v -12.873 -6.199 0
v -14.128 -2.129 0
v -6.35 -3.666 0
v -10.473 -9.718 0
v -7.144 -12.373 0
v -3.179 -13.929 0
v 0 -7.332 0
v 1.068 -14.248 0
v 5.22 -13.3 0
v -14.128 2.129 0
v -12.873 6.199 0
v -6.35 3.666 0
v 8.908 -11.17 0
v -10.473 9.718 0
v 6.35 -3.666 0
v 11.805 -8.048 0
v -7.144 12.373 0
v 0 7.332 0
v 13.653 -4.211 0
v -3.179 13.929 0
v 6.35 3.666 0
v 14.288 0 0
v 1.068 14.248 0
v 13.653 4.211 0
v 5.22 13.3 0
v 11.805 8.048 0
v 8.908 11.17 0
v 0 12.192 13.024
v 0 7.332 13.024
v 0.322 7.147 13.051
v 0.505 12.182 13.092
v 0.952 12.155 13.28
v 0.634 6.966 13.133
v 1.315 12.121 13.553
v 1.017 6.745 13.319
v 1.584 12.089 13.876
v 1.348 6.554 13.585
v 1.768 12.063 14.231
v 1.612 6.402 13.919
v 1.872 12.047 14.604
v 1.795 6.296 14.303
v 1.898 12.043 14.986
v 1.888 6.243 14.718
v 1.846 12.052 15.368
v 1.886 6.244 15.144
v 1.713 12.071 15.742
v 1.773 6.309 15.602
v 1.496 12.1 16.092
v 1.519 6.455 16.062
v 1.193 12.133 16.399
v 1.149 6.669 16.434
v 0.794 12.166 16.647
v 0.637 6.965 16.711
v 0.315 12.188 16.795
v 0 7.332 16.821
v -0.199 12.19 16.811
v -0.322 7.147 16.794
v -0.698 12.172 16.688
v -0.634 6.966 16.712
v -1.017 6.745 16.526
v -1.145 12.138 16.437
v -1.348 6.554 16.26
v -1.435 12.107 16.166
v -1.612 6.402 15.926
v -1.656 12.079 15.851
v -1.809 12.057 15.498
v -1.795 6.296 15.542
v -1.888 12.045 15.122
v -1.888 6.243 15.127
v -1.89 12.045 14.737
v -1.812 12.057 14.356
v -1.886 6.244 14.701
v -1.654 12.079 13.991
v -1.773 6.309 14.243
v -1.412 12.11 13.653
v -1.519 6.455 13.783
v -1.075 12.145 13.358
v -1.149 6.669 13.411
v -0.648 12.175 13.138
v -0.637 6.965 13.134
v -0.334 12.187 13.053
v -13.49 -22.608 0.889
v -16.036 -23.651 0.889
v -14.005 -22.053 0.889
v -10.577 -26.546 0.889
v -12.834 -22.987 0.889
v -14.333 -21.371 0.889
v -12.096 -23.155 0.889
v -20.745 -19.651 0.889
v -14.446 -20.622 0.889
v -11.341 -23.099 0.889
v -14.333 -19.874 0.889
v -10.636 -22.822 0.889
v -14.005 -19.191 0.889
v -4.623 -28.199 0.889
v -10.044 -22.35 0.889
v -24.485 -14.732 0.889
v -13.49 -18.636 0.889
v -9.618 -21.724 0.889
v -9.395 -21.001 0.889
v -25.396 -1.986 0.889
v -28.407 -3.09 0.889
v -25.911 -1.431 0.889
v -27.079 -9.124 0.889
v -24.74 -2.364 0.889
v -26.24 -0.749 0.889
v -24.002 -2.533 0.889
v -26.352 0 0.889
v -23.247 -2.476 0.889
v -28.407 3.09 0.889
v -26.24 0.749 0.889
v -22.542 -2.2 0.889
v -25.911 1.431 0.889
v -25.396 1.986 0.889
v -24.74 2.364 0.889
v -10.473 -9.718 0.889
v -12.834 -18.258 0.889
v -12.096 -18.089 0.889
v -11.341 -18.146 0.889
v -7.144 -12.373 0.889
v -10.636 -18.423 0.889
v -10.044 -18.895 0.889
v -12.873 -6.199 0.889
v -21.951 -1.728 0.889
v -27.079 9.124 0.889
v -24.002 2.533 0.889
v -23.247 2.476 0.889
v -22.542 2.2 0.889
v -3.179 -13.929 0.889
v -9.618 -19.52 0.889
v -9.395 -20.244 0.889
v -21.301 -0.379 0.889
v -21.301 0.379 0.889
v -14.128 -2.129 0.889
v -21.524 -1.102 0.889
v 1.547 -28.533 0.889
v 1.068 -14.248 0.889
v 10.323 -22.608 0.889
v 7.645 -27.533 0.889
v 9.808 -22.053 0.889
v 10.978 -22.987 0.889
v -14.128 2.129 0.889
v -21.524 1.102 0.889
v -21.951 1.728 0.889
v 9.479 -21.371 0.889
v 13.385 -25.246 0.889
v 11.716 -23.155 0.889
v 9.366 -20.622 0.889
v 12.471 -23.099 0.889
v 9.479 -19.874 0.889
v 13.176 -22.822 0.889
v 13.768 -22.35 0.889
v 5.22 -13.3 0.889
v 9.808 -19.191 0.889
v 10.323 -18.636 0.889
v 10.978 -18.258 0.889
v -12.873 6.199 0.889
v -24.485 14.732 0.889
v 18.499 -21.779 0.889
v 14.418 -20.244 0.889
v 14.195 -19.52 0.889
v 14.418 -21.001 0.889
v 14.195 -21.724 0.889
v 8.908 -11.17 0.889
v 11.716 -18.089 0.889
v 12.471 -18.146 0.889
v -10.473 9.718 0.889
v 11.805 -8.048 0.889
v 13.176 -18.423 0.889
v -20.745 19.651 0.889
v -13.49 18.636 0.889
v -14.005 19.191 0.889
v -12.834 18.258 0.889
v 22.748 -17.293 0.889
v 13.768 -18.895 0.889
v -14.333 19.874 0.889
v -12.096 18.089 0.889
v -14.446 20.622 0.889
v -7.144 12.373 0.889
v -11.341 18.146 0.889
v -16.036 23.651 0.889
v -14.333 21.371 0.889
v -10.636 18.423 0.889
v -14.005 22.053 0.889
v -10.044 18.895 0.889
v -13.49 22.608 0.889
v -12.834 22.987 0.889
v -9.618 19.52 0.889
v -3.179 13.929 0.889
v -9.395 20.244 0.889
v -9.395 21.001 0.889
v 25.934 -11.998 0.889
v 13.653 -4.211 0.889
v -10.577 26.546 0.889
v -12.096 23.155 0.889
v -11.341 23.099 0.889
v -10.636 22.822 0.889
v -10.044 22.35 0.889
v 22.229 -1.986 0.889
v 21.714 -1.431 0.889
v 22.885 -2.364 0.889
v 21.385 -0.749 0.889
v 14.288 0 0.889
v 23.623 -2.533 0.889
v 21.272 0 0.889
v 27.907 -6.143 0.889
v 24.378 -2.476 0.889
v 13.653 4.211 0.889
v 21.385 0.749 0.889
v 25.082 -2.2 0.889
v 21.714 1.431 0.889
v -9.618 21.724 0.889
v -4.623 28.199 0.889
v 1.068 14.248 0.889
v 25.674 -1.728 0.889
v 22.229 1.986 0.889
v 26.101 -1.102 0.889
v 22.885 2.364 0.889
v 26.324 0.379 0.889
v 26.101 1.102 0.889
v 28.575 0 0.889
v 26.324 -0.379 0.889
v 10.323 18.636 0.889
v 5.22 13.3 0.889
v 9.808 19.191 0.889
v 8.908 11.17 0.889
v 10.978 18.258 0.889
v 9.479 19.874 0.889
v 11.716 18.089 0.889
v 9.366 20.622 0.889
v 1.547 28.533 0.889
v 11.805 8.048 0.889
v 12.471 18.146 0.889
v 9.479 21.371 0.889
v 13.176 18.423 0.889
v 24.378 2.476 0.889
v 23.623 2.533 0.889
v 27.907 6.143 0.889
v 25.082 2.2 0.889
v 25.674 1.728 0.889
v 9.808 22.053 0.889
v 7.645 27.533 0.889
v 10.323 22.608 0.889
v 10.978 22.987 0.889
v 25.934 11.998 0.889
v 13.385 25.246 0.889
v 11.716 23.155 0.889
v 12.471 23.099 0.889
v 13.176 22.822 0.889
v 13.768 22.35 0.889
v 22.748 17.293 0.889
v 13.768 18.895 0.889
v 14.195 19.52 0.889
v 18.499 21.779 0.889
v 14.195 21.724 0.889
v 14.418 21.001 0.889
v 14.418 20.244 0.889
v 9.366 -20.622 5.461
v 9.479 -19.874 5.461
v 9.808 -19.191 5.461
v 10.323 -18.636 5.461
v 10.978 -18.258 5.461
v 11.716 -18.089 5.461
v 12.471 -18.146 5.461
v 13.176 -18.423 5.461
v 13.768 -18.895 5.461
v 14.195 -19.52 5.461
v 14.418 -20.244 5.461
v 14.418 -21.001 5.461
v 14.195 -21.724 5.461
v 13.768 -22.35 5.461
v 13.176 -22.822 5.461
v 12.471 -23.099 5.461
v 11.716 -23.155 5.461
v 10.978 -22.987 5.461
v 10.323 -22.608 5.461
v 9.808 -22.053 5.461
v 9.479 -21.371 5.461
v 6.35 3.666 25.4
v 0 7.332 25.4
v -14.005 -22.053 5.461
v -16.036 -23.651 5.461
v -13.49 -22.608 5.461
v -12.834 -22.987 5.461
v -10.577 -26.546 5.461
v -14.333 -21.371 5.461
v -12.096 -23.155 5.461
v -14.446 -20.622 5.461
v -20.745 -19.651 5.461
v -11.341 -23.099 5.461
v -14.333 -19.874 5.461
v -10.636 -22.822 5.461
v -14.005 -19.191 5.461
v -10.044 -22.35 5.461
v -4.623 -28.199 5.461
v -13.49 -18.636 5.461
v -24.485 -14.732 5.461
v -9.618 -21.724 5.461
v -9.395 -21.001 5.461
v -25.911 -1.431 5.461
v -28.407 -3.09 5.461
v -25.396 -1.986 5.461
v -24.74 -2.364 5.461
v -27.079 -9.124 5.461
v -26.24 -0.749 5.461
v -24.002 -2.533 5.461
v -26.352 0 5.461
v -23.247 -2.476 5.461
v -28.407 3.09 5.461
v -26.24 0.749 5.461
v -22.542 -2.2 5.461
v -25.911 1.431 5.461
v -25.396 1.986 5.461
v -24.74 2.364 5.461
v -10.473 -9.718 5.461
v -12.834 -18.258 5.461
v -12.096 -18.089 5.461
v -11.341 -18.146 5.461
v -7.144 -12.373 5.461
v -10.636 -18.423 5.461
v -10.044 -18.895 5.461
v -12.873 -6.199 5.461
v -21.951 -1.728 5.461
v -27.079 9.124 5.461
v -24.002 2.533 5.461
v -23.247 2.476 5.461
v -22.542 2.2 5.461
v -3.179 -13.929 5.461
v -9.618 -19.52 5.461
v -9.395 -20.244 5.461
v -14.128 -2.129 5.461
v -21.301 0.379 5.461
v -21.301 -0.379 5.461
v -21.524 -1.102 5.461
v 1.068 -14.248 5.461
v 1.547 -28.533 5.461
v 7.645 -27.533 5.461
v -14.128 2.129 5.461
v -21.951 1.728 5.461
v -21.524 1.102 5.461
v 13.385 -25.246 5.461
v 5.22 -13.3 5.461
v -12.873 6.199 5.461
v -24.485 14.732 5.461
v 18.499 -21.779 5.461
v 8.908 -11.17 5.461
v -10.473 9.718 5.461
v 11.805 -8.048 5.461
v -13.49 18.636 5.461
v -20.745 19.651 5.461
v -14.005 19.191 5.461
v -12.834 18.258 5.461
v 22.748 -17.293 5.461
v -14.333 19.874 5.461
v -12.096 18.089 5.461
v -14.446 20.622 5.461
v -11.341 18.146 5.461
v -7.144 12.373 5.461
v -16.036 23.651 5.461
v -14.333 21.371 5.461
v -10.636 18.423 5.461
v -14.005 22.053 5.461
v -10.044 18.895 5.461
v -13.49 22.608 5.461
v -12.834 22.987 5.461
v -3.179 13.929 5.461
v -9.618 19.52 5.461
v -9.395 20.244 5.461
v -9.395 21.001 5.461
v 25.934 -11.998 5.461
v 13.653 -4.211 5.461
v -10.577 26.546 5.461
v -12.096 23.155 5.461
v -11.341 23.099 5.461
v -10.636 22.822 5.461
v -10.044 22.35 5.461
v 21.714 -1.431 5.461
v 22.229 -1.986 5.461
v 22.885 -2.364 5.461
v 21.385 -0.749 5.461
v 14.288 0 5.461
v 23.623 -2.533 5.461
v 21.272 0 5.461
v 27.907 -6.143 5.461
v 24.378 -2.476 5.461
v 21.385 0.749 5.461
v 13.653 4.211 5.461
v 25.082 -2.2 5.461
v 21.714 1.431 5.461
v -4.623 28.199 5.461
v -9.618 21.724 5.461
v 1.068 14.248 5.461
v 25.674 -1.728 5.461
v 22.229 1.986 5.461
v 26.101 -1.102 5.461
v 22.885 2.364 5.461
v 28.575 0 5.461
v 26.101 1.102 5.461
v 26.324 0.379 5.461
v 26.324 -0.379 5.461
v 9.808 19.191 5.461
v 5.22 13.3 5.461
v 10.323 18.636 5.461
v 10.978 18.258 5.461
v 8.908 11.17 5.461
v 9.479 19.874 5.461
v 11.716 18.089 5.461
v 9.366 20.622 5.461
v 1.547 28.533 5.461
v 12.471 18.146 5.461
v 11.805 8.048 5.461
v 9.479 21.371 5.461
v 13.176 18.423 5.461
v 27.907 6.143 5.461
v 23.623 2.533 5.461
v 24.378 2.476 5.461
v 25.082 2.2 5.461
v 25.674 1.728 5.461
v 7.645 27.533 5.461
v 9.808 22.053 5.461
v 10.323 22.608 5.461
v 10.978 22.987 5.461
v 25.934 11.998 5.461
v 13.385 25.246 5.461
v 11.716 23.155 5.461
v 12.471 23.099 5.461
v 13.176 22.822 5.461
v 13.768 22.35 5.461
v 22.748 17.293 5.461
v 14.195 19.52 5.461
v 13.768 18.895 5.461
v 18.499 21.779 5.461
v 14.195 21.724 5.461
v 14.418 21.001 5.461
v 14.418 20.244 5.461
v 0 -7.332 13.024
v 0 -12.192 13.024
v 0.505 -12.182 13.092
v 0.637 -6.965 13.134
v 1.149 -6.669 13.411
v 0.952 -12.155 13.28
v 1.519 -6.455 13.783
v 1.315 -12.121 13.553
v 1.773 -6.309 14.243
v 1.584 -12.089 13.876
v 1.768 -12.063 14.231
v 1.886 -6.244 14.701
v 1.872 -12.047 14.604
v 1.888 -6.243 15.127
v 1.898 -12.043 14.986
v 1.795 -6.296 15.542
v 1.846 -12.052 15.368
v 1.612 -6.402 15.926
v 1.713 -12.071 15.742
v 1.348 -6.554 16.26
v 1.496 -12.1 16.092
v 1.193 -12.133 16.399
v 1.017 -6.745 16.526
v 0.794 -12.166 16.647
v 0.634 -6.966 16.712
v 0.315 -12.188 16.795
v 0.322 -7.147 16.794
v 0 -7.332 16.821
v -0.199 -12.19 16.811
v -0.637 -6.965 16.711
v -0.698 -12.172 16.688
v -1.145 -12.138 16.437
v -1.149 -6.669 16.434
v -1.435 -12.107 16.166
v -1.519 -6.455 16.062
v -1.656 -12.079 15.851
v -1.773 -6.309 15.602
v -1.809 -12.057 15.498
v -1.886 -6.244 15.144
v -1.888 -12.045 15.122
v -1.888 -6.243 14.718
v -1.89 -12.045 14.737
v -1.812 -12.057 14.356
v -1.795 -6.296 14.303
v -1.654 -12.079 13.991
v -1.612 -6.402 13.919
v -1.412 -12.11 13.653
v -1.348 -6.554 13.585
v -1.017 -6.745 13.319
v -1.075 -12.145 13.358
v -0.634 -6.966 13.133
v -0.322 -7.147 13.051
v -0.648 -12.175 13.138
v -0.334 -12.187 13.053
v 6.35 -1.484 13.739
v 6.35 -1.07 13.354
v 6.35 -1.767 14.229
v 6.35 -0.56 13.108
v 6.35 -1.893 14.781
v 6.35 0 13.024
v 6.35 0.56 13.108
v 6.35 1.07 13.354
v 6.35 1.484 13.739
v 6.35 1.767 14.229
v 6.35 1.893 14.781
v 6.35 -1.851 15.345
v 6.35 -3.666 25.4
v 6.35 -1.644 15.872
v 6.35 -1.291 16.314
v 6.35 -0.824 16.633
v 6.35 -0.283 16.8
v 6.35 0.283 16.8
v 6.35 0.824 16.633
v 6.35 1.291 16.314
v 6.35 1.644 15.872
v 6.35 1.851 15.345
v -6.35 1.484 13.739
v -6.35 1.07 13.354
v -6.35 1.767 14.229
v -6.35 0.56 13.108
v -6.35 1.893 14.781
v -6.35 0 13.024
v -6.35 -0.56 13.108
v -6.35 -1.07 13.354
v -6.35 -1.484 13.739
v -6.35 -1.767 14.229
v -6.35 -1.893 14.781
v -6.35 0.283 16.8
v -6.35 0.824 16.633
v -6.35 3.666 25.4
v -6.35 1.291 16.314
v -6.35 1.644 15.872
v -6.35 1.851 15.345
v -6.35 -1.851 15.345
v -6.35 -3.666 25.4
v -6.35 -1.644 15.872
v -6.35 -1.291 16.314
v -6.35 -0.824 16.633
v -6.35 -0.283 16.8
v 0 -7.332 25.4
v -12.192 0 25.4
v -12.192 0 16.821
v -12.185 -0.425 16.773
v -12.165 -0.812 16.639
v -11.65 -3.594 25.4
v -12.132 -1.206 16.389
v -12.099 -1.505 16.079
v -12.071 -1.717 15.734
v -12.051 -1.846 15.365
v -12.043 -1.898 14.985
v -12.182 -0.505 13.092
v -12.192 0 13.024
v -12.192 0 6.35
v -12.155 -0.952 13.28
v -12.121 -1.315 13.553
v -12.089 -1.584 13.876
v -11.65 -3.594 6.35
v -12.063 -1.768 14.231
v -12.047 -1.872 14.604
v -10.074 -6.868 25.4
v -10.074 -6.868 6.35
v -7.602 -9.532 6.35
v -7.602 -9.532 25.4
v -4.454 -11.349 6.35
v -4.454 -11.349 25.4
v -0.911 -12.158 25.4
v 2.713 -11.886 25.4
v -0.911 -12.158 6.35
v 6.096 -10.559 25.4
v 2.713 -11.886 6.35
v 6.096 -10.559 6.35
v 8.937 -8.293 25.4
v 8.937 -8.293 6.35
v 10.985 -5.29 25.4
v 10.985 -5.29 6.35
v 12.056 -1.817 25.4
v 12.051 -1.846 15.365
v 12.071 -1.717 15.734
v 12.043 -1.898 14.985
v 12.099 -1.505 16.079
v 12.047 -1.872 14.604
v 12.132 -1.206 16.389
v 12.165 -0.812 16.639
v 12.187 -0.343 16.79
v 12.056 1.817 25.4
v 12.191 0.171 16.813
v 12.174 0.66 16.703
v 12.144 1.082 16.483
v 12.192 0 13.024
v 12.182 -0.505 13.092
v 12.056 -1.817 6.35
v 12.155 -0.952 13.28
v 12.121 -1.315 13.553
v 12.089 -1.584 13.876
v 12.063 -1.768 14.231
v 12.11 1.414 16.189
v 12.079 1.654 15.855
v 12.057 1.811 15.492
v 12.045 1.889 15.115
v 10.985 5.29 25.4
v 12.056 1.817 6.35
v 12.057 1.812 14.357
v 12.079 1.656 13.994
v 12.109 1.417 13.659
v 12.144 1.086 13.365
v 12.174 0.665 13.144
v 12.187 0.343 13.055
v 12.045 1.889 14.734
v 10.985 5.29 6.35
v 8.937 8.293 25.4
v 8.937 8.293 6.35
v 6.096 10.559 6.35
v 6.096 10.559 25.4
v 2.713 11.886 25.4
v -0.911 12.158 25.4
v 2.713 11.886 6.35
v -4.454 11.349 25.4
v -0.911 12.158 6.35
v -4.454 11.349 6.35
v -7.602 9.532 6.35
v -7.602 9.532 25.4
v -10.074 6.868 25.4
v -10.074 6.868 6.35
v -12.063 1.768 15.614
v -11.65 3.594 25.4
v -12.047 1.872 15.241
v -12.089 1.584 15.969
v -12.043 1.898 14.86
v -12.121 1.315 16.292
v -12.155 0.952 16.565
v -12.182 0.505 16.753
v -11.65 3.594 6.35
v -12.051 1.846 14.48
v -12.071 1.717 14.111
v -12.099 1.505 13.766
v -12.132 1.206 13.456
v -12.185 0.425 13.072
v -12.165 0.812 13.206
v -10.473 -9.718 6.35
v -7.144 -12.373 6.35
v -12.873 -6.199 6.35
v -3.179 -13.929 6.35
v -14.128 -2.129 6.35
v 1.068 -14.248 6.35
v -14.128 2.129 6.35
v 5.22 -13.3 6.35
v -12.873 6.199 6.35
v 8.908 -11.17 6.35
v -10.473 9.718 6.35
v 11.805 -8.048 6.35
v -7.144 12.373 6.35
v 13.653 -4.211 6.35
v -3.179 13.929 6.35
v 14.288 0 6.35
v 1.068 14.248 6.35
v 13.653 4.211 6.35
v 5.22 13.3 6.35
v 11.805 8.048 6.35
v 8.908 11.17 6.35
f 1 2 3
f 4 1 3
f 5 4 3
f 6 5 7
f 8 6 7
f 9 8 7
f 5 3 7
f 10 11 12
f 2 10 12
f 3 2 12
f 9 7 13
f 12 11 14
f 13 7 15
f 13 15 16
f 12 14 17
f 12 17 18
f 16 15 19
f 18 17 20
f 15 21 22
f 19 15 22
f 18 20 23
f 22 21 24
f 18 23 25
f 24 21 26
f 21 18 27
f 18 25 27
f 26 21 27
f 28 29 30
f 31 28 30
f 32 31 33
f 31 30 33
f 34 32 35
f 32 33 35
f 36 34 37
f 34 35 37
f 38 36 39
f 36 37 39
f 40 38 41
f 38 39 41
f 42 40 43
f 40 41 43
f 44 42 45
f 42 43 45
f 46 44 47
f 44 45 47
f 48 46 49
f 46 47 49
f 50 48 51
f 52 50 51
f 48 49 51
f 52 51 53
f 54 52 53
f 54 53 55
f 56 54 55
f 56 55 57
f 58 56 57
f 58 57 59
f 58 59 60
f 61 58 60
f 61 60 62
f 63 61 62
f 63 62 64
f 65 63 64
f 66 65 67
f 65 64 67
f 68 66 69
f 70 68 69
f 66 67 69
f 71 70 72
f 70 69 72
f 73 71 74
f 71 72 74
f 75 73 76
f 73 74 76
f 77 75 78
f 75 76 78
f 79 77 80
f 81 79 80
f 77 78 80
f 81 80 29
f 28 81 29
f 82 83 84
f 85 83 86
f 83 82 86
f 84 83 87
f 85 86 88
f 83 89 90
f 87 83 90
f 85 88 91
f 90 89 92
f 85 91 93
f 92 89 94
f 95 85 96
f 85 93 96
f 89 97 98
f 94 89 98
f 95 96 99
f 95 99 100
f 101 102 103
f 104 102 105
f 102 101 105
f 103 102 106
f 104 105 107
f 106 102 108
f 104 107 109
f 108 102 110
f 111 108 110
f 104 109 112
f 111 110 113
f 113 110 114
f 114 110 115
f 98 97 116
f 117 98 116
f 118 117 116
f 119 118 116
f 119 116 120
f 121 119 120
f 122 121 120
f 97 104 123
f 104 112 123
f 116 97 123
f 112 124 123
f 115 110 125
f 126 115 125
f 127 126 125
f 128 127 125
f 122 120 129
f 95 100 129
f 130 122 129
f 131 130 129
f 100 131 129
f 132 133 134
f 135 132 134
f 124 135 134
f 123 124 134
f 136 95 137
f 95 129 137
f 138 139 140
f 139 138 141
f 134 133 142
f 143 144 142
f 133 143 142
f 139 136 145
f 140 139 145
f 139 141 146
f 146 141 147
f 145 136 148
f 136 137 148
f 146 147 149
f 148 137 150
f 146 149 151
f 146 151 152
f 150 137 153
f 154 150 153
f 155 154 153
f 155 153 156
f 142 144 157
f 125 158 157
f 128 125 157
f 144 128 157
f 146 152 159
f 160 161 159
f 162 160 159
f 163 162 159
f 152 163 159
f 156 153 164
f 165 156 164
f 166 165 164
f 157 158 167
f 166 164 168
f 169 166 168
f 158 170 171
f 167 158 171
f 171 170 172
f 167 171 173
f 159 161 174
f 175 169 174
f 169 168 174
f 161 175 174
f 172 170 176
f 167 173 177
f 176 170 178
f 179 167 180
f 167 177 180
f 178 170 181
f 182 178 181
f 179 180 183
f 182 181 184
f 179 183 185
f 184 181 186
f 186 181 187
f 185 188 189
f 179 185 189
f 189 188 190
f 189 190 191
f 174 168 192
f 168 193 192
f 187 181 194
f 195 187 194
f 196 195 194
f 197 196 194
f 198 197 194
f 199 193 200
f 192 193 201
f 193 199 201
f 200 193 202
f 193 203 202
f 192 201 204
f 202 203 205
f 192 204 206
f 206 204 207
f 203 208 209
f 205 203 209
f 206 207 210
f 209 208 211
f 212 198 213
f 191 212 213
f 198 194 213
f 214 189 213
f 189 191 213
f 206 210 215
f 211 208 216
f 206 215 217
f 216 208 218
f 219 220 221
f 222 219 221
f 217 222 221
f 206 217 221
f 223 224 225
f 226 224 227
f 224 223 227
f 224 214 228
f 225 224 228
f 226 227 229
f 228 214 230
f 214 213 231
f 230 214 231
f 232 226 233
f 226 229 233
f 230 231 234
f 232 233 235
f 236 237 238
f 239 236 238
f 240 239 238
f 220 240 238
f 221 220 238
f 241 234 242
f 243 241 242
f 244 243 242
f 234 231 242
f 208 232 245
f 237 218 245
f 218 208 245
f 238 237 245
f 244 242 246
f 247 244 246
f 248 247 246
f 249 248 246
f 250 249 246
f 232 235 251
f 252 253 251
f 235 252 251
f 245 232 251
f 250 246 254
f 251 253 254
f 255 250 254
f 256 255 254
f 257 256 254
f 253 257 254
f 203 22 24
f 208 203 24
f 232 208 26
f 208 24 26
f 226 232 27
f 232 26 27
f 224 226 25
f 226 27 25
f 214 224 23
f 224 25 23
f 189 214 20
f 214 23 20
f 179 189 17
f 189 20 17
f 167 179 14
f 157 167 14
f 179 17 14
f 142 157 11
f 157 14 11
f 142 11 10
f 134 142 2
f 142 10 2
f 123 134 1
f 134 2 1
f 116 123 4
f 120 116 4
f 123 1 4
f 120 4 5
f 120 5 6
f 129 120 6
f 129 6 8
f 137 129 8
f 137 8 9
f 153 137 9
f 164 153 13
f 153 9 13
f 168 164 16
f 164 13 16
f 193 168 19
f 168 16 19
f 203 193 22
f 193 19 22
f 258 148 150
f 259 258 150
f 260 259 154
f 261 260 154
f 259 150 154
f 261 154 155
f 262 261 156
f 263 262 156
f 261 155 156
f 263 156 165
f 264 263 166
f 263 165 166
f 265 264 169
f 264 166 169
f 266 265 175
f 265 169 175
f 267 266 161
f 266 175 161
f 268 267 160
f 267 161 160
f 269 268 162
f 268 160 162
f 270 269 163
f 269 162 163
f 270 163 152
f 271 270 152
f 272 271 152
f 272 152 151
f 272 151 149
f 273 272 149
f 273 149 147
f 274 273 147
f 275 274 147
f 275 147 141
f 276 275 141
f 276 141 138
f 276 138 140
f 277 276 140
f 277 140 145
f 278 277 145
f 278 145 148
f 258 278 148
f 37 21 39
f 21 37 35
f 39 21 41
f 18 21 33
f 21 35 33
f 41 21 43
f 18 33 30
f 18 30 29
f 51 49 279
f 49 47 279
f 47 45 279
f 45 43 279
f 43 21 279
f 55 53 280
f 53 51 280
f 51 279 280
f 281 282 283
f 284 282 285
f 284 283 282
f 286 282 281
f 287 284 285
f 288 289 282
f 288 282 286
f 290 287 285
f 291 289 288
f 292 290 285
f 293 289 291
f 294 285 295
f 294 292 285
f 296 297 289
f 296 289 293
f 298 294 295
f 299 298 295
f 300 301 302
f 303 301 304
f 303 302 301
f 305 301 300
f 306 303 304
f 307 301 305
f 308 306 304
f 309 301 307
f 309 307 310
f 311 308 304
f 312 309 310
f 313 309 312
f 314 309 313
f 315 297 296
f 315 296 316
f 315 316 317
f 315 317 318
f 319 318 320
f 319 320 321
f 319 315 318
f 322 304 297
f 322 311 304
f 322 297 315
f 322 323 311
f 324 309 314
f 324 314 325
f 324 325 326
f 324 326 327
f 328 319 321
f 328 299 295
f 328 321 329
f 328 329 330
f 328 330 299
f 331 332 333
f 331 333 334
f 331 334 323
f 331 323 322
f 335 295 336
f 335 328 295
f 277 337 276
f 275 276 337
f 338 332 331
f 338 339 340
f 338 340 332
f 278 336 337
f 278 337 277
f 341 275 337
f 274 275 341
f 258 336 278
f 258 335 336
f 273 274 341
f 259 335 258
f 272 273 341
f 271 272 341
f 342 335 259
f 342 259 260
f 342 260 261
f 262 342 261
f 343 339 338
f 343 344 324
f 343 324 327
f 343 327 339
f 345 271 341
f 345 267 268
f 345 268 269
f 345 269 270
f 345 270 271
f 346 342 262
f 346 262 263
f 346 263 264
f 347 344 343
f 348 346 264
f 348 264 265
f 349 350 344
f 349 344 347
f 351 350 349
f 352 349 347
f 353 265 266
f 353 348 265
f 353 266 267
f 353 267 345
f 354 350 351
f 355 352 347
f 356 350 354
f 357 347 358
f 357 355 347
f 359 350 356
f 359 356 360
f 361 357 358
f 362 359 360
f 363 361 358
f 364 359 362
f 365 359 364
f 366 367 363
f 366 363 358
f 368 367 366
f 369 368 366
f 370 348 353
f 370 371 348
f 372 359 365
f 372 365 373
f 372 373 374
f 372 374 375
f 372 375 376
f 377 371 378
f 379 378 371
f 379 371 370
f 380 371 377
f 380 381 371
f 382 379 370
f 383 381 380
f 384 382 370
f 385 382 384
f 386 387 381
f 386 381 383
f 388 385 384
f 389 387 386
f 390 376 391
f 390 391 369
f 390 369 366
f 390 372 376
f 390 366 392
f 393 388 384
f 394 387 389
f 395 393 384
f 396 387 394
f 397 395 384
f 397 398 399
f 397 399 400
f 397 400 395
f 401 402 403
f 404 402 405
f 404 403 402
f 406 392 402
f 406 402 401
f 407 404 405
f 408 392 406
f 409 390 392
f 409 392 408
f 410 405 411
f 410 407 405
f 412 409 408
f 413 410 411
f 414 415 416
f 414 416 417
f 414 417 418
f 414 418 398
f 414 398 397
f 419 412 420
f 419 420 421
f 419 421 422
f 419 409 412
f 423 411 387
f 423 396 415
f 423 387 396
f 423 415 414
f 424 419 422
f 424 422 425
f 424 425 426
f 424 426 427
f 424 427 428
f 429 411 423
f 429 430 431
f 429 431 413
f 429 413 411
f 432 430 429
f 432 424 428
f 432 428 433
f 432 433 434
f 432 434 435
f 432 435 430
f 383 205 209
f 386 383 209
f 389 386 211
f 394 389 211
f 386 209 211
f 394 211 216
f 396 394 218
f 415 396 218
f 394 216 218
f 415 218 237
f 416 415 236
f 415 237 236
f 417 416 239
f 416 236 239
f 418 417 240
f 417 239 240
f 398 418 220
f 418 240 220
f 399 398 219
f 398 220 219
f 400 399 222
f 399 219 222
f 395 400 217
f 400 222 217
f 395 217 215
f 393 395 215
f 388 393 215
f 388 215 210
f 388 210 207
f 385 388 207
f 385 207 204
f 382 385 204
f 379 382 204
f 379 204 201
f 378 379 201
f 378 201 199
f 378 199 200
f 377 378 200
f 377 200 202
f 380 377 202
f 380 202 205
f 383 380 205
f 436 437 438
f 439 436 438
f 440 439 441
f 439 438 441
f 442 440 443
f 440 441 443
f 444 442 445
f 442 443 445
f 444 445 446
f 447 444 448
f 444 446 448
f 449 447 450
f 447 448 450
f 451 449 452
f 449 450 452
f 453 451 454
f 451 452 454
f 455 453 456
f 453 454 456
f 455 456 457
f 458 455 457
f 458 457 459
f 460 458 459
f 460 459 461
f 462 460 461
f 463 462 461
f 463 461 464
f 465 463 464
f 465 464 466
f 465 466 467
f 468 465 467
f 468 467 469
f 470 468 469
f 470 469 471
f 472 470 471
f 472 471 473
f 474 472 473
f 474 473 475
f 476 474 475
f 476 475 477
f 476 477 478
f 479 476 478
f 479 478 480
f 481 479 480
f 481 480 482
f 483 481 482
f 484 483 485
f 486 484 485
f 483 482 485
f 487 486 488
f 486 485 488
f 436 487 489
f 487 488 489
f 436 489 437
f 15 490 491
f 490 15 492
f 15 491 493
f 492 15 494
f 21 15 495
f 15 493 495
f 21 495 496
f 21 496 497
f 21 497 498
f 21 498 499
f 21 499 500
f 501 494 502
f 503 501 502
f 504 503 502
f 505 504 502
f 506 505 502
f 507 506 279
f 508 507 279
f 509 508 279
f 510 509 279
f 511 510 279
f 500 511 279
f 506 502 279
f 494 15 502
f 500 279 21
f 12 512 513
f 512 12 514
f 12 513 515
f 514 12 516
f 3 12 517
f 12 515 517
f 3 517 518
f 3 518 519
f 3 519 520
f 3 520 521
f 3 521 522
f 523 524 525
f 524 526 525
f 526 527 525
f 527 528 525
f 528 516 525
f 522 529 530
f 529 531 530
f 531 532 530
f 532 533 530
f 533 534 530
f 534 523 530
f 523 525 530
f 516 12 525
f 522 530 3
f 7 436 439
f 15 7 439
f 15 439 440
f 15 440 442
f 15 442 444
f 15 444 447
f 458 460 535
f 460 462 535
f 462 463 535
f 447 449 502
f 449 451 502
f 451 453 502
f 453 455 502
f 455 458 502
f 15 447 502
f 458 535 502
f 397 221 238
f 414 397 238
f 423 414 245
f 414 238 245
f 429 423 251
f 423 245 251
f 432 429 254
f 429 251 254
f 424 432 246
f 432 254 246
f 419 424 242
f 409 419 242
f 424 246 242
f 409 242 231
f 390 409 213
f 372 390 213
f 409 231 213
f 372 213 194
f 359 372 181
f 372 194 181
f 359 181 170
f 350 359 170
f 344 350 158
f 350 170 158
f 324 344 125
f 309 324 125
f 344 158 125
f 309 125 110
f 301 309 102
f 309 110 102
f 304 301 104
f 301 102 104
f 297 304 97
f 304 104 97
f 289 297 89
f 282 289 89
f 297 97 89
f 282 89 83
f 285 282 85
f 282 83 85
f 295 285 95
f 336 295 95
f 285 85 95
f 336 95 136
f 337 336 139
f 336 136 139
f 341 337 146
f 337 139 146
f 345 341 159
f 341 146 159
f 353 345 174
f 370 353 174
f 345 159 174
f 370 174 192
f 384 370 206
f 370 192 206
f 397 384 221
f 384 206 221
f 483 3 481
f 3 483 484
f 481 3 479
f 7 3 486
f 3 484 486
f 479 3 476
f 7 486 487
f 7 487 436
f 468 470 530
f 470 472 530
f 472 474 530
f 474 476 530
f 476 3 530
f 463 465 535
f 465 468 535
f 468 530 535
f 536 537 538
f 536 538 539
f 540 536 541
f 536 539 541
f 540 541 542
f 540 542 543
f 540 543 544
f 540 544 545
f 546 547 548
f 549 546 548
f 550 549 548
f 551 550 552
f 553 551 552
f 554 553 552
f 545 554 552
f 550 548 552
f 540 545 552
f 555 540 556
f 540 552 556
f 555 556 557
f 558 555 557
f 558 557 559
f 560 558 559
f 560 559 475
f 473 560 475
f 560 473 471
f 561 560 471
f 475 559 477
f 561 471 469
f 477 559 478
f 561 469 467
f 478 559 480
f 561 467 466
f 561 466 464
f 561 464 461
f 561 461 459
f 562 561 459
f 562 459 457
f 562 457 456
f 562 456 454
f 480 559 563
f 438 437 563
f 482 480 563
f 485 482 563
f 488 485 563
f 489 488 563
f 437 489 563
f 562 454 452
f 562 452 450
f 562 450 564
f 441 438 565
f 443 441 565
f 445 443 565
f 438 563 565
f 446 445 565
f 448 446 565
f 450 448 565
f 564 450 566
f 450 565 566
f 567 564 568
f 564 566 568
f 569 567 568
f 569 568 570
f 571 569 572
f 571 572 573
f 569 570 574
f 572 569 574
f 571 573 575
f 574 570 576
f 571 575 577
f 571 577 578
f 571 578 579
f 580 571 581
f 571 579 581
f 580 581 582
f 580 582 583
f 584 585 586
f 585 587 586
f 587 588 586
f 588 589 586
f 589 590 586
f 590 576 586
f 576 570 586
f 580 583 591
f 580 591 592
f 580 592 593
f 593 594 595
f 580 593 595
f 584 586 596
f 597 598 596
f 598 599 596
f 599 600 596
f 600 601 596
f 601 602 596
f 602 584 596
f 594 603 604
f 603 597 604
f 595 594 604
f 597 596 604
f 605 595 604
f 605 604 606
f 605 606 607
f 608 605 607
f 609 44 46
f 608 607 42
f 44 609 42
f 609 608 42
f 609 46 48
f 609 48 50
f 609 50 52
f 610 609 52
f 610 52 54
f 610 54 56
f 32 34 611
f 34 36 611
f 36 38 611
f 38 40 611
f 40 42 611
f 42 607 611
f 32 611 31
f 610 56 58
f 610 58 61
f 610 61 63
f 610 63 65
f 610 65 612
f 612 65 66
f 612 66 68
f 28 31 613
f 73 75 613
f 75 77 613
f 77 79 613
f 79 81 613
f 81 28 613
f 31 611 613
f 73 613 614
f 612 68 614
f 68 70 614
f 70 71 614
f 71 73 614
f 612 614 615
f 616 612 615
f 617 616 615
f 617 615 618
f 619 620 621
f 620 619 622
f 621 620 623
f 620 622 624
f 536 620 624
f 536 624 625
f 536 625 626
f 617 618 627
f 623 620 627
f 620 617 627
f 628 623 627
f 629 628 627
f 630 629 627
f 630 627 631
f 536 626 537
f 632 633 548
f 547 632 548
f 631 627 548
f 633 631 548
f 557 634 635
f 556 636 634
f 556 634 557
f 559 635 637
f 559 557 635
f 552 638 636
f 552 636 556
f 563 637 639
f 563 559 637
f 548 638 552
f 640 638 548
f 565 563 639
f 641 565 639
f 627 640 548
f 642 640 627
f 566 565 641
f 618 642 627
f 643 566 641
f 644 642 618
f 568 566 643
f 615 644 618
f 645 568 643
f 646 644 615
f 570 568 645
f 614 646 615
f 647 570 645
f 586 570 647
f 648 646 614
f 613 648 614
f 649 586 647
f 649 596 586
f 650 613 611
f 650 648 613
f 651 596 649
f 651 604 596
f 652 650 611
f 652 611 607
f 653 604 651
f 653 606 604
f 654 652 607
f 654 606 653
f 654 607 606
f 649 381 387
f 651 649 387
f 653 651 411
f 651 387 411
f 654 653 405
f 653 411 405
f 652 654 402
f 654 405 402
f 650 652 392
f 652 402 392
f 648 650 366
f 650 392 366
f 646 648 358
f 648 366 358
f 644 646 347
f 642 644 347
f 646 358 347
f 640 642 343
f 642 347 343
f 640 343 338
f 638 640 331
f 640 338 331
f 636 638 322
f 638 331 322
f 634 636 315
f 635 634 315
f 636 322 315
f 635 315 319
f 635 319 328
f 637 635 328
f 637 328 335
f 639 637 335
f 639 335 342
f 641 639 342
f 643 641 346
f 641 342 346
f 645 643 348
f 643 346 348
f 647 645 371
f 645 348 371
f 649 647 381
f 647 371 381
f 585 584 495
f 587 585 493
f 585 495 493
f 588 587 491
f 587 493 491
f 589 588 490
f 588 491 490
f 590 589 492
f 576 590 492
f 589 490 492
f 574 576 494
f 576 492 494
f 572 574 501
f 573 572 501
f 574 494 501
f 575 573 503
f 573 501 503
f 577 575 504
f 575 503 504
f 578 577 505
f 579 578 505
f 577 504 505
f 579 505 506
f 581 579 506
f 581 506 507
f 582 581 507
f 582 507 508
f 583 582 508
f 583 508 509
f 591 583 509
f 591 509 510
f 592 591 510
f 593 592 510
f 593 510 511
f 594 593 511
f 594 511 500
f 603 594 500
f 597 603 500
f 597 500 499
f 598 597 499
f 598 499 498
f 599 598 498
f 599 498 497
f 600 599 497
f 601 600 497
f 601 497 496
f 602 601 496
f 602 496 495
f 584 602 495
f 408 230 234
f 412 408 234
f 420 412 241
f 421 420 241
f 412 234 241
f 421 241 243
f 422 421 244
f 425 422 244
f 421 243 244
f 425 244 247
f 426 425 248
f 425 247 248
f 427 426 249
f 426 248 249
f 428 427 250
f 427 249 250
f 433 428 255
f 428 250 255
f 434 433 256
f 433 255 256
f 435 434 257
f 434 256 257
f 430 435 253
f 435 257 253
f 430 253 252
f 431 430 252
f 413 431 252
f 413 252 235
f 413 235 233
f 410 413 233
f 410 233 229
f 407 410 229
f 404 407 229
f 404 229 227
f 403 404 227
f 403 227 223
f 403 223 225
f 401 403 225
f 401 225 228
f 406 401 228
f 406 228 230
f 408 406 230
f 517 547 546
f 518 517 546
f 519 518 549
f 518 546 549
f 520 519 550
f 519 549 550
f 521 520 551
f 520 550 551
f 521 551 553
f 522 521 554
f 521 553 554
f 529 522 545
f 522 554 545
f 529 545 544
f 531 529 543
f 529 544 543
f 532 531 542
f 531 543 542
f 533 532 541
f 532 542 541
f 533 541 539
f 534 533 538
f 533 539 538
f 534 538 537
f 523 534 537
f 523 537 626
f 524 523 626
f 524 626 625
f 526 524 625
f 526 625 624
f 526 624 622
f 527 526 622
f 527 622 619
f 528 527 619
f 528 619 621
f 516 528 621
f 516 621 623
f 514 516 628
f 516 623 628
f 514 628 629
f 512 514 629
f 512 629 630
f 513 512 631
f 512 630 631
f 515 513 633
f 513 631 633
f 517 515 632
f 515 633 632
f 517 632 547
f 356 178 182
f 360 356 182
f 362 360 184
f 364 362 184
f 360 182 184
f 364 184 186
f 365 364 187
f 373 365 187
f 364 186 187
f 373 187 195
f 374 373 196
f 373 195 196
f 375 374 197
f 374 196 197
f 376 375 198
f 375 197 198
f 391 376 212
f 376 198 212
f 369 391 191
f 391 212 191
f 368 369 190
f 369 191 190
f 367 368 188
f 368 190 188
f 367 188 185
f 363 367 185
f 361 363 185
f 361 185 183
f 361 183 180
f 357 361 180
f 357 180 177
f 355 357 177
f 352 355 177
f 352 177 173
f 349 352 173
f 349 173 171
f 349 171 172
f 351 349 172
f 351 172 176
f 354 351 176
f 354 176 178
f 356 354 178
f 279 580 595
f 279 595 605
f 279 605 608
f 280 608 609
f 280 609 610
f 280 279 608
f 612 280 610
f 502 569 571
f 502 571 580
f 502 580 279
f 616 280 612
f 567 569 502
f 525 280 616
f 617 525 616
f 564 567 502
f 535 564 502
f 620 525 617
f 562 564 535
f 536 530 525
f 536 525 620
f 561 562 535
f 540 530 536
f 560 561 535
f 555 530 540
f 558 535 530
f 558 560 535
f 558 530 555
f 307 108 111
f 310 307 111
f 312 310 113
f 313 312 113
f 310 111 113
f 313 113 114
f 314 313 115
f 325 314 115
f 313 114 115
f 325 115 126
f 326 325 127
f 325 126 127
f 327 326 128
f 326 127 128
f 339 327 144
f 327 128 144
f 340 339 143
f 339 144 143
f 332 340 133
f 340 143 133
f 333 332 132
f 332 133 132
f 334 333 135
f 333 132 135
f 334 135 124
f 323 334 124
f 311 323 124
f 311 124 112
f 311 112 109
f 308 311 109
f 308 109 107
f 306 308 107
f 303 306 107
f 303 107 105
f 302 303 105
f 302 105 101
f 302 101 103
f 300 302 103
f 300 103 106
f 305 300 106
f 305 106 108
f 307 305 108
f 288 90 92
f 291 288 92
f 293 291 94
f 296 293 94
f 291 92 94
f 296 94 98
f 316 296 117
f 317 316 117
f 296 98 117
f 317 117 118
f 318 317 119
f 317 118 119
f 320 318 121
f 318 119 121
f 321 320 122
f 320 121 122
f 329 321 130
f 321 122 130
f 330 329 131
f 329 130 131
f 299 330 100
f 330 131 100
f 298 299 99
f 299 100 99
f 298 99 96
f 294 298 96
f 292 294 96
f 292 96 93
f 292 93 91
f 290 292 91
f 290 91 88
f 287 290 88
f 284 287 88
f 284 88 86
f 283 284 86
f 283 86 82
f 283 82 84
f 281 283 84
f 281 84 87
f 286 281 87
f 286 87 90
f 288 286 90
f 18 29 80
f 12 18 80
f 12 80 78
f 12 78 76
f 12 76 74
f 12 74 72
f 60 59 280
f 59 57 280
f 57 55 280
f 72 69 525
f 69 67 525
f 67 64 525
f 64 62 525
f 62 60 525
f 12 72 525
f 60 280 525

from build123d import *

# Parameters (mm, degrees)
SKETCH1_R              = 14.2875
BOSS_EXTRUDE1_DEPTH    = 0.889
SKETCH2_R              = 28.575
BOSS_EXTRUDE2_DEPTH    = 4.572
SKETCH3_R              = 14.2875
BOSS_EXTRUDE3_DEPTH    = 0.889
SKETCH4_R              = 12.192
BOSS_EXTRUDE4_DEPTH    = 19.05
SKETCH5_R              = 2.54
CUT_EXTRUDE1_DEPTH     = 48.2636263
CUT_EXTRUDE2_DEPTH     = 48.730716001
F_10_24_TAPPED_HOLE1_D = 3.7973
CIRPATTERN1_COUNT      = 2
CIRPATTERN1_ANGLE      = 90


with BuildPart() as part:
    # Sketch1 → Boss-Extrude1 (new body)
    with BuildSketch(Plane.XY):
        Circle(SKETCH1_R)
    extrude(amount=BOSS_EXTRUDE1_DEPTH)

    # Sketch2 → Boss-Extrude2 (add)
    with BuildSketch(Plane.XY.offset(0.889)):
        Circle(SKETCH2_R)
    extrude(amount=BOSS_EXTRUDE2_DEPTH)

    # Sketch3 → Boss-Extrude3 (add)
    with BuildSketch(Plane.XY.offset(5.461)):
        Circle(SKETCH3_R)
    extrude(amount=BOSS_EXTRUDE3_DEPTH)

    # Sketch4 → Boss-Extrude4 (add)
    with BuildSketch(Plane.XY.offset(6.35)):
        with Locations(Location((0, 0, 0), (0, 0, 180))):
            Circle(SKETCH4_R)
    extrude(amount=BOSS_EXTRUDE4_DEPTH)

    # Sketch5 → Cut-Extrude1 (cut, through all)
    with BuildSketch(Plane(origin=(0, 0, 0.889), x_dir=(-1, 0, 0), z_dir=(0, 0, -1))):
        with Locations((-11.90625, 20.622229928)):
            Circle(SKETCH5_R)
        with Locations((11.90625, 20.622229928)):
            Circle(SKETCH5_R)
        with Locations((23.8125, 0)):
            Circle(SKETCH5_R)
        with Locations((11.90625, -20.622229928)):
            Circle(SKETCH5_R)
        with Locations((-11.90625, -20.622229928)):
            Circle(SKETCH5_R)
        with Locations((-23.8125, 0)):
            Circle(SKETCH5_R)
    extrude(amount=-CUT_EXTRUDE1_DEPTH, mode=Mode.SUBTRACT)

    # Sketch6 → Cut-Extrude2 (cut, through all)
    with BuildSketch(Plane.XY.offset(25.4)):
        Polygon((0, 7.332348419), (-6.35, 3.666174209), (-6.35, -3.666174209), (0, -7.332348419), (6.35, -3.666174209), (6.35, 3.666174209), align=None)
    extrude(amount=-CUT_EXTRUDE2_DEPTH, mode=Mode.SUBTRACT)

    # #10-24 Tapped Hole1 (through all)
    with Locations(Plane(origin=(12.192, 0, 14.9225), x_dir=(0, 0, 1), z_dir=(1, 0, 0))):
        with Locations((0, 0)):
            f_10_24_tapped_hole1 = Hole(F_10_24_TAPPED_HOLE1_D / 2)

    # CirPattern1: #10-24 Tapped Hole1 ×2 about axis
    cirpattern1_axis = Axis((0, 0, 5.461), (0, 0, 1))
    for i in range(1, CIRPATTERN1_COUNT):
        add(f_10_24_tapped_hole1.rotate(cirpattern1_axis, i * CIRPATTERN1_ANGLE / (CIRPATTERN1_COUNT - 1)), mode=Mode.SUBTRACT)


solid = part.part
